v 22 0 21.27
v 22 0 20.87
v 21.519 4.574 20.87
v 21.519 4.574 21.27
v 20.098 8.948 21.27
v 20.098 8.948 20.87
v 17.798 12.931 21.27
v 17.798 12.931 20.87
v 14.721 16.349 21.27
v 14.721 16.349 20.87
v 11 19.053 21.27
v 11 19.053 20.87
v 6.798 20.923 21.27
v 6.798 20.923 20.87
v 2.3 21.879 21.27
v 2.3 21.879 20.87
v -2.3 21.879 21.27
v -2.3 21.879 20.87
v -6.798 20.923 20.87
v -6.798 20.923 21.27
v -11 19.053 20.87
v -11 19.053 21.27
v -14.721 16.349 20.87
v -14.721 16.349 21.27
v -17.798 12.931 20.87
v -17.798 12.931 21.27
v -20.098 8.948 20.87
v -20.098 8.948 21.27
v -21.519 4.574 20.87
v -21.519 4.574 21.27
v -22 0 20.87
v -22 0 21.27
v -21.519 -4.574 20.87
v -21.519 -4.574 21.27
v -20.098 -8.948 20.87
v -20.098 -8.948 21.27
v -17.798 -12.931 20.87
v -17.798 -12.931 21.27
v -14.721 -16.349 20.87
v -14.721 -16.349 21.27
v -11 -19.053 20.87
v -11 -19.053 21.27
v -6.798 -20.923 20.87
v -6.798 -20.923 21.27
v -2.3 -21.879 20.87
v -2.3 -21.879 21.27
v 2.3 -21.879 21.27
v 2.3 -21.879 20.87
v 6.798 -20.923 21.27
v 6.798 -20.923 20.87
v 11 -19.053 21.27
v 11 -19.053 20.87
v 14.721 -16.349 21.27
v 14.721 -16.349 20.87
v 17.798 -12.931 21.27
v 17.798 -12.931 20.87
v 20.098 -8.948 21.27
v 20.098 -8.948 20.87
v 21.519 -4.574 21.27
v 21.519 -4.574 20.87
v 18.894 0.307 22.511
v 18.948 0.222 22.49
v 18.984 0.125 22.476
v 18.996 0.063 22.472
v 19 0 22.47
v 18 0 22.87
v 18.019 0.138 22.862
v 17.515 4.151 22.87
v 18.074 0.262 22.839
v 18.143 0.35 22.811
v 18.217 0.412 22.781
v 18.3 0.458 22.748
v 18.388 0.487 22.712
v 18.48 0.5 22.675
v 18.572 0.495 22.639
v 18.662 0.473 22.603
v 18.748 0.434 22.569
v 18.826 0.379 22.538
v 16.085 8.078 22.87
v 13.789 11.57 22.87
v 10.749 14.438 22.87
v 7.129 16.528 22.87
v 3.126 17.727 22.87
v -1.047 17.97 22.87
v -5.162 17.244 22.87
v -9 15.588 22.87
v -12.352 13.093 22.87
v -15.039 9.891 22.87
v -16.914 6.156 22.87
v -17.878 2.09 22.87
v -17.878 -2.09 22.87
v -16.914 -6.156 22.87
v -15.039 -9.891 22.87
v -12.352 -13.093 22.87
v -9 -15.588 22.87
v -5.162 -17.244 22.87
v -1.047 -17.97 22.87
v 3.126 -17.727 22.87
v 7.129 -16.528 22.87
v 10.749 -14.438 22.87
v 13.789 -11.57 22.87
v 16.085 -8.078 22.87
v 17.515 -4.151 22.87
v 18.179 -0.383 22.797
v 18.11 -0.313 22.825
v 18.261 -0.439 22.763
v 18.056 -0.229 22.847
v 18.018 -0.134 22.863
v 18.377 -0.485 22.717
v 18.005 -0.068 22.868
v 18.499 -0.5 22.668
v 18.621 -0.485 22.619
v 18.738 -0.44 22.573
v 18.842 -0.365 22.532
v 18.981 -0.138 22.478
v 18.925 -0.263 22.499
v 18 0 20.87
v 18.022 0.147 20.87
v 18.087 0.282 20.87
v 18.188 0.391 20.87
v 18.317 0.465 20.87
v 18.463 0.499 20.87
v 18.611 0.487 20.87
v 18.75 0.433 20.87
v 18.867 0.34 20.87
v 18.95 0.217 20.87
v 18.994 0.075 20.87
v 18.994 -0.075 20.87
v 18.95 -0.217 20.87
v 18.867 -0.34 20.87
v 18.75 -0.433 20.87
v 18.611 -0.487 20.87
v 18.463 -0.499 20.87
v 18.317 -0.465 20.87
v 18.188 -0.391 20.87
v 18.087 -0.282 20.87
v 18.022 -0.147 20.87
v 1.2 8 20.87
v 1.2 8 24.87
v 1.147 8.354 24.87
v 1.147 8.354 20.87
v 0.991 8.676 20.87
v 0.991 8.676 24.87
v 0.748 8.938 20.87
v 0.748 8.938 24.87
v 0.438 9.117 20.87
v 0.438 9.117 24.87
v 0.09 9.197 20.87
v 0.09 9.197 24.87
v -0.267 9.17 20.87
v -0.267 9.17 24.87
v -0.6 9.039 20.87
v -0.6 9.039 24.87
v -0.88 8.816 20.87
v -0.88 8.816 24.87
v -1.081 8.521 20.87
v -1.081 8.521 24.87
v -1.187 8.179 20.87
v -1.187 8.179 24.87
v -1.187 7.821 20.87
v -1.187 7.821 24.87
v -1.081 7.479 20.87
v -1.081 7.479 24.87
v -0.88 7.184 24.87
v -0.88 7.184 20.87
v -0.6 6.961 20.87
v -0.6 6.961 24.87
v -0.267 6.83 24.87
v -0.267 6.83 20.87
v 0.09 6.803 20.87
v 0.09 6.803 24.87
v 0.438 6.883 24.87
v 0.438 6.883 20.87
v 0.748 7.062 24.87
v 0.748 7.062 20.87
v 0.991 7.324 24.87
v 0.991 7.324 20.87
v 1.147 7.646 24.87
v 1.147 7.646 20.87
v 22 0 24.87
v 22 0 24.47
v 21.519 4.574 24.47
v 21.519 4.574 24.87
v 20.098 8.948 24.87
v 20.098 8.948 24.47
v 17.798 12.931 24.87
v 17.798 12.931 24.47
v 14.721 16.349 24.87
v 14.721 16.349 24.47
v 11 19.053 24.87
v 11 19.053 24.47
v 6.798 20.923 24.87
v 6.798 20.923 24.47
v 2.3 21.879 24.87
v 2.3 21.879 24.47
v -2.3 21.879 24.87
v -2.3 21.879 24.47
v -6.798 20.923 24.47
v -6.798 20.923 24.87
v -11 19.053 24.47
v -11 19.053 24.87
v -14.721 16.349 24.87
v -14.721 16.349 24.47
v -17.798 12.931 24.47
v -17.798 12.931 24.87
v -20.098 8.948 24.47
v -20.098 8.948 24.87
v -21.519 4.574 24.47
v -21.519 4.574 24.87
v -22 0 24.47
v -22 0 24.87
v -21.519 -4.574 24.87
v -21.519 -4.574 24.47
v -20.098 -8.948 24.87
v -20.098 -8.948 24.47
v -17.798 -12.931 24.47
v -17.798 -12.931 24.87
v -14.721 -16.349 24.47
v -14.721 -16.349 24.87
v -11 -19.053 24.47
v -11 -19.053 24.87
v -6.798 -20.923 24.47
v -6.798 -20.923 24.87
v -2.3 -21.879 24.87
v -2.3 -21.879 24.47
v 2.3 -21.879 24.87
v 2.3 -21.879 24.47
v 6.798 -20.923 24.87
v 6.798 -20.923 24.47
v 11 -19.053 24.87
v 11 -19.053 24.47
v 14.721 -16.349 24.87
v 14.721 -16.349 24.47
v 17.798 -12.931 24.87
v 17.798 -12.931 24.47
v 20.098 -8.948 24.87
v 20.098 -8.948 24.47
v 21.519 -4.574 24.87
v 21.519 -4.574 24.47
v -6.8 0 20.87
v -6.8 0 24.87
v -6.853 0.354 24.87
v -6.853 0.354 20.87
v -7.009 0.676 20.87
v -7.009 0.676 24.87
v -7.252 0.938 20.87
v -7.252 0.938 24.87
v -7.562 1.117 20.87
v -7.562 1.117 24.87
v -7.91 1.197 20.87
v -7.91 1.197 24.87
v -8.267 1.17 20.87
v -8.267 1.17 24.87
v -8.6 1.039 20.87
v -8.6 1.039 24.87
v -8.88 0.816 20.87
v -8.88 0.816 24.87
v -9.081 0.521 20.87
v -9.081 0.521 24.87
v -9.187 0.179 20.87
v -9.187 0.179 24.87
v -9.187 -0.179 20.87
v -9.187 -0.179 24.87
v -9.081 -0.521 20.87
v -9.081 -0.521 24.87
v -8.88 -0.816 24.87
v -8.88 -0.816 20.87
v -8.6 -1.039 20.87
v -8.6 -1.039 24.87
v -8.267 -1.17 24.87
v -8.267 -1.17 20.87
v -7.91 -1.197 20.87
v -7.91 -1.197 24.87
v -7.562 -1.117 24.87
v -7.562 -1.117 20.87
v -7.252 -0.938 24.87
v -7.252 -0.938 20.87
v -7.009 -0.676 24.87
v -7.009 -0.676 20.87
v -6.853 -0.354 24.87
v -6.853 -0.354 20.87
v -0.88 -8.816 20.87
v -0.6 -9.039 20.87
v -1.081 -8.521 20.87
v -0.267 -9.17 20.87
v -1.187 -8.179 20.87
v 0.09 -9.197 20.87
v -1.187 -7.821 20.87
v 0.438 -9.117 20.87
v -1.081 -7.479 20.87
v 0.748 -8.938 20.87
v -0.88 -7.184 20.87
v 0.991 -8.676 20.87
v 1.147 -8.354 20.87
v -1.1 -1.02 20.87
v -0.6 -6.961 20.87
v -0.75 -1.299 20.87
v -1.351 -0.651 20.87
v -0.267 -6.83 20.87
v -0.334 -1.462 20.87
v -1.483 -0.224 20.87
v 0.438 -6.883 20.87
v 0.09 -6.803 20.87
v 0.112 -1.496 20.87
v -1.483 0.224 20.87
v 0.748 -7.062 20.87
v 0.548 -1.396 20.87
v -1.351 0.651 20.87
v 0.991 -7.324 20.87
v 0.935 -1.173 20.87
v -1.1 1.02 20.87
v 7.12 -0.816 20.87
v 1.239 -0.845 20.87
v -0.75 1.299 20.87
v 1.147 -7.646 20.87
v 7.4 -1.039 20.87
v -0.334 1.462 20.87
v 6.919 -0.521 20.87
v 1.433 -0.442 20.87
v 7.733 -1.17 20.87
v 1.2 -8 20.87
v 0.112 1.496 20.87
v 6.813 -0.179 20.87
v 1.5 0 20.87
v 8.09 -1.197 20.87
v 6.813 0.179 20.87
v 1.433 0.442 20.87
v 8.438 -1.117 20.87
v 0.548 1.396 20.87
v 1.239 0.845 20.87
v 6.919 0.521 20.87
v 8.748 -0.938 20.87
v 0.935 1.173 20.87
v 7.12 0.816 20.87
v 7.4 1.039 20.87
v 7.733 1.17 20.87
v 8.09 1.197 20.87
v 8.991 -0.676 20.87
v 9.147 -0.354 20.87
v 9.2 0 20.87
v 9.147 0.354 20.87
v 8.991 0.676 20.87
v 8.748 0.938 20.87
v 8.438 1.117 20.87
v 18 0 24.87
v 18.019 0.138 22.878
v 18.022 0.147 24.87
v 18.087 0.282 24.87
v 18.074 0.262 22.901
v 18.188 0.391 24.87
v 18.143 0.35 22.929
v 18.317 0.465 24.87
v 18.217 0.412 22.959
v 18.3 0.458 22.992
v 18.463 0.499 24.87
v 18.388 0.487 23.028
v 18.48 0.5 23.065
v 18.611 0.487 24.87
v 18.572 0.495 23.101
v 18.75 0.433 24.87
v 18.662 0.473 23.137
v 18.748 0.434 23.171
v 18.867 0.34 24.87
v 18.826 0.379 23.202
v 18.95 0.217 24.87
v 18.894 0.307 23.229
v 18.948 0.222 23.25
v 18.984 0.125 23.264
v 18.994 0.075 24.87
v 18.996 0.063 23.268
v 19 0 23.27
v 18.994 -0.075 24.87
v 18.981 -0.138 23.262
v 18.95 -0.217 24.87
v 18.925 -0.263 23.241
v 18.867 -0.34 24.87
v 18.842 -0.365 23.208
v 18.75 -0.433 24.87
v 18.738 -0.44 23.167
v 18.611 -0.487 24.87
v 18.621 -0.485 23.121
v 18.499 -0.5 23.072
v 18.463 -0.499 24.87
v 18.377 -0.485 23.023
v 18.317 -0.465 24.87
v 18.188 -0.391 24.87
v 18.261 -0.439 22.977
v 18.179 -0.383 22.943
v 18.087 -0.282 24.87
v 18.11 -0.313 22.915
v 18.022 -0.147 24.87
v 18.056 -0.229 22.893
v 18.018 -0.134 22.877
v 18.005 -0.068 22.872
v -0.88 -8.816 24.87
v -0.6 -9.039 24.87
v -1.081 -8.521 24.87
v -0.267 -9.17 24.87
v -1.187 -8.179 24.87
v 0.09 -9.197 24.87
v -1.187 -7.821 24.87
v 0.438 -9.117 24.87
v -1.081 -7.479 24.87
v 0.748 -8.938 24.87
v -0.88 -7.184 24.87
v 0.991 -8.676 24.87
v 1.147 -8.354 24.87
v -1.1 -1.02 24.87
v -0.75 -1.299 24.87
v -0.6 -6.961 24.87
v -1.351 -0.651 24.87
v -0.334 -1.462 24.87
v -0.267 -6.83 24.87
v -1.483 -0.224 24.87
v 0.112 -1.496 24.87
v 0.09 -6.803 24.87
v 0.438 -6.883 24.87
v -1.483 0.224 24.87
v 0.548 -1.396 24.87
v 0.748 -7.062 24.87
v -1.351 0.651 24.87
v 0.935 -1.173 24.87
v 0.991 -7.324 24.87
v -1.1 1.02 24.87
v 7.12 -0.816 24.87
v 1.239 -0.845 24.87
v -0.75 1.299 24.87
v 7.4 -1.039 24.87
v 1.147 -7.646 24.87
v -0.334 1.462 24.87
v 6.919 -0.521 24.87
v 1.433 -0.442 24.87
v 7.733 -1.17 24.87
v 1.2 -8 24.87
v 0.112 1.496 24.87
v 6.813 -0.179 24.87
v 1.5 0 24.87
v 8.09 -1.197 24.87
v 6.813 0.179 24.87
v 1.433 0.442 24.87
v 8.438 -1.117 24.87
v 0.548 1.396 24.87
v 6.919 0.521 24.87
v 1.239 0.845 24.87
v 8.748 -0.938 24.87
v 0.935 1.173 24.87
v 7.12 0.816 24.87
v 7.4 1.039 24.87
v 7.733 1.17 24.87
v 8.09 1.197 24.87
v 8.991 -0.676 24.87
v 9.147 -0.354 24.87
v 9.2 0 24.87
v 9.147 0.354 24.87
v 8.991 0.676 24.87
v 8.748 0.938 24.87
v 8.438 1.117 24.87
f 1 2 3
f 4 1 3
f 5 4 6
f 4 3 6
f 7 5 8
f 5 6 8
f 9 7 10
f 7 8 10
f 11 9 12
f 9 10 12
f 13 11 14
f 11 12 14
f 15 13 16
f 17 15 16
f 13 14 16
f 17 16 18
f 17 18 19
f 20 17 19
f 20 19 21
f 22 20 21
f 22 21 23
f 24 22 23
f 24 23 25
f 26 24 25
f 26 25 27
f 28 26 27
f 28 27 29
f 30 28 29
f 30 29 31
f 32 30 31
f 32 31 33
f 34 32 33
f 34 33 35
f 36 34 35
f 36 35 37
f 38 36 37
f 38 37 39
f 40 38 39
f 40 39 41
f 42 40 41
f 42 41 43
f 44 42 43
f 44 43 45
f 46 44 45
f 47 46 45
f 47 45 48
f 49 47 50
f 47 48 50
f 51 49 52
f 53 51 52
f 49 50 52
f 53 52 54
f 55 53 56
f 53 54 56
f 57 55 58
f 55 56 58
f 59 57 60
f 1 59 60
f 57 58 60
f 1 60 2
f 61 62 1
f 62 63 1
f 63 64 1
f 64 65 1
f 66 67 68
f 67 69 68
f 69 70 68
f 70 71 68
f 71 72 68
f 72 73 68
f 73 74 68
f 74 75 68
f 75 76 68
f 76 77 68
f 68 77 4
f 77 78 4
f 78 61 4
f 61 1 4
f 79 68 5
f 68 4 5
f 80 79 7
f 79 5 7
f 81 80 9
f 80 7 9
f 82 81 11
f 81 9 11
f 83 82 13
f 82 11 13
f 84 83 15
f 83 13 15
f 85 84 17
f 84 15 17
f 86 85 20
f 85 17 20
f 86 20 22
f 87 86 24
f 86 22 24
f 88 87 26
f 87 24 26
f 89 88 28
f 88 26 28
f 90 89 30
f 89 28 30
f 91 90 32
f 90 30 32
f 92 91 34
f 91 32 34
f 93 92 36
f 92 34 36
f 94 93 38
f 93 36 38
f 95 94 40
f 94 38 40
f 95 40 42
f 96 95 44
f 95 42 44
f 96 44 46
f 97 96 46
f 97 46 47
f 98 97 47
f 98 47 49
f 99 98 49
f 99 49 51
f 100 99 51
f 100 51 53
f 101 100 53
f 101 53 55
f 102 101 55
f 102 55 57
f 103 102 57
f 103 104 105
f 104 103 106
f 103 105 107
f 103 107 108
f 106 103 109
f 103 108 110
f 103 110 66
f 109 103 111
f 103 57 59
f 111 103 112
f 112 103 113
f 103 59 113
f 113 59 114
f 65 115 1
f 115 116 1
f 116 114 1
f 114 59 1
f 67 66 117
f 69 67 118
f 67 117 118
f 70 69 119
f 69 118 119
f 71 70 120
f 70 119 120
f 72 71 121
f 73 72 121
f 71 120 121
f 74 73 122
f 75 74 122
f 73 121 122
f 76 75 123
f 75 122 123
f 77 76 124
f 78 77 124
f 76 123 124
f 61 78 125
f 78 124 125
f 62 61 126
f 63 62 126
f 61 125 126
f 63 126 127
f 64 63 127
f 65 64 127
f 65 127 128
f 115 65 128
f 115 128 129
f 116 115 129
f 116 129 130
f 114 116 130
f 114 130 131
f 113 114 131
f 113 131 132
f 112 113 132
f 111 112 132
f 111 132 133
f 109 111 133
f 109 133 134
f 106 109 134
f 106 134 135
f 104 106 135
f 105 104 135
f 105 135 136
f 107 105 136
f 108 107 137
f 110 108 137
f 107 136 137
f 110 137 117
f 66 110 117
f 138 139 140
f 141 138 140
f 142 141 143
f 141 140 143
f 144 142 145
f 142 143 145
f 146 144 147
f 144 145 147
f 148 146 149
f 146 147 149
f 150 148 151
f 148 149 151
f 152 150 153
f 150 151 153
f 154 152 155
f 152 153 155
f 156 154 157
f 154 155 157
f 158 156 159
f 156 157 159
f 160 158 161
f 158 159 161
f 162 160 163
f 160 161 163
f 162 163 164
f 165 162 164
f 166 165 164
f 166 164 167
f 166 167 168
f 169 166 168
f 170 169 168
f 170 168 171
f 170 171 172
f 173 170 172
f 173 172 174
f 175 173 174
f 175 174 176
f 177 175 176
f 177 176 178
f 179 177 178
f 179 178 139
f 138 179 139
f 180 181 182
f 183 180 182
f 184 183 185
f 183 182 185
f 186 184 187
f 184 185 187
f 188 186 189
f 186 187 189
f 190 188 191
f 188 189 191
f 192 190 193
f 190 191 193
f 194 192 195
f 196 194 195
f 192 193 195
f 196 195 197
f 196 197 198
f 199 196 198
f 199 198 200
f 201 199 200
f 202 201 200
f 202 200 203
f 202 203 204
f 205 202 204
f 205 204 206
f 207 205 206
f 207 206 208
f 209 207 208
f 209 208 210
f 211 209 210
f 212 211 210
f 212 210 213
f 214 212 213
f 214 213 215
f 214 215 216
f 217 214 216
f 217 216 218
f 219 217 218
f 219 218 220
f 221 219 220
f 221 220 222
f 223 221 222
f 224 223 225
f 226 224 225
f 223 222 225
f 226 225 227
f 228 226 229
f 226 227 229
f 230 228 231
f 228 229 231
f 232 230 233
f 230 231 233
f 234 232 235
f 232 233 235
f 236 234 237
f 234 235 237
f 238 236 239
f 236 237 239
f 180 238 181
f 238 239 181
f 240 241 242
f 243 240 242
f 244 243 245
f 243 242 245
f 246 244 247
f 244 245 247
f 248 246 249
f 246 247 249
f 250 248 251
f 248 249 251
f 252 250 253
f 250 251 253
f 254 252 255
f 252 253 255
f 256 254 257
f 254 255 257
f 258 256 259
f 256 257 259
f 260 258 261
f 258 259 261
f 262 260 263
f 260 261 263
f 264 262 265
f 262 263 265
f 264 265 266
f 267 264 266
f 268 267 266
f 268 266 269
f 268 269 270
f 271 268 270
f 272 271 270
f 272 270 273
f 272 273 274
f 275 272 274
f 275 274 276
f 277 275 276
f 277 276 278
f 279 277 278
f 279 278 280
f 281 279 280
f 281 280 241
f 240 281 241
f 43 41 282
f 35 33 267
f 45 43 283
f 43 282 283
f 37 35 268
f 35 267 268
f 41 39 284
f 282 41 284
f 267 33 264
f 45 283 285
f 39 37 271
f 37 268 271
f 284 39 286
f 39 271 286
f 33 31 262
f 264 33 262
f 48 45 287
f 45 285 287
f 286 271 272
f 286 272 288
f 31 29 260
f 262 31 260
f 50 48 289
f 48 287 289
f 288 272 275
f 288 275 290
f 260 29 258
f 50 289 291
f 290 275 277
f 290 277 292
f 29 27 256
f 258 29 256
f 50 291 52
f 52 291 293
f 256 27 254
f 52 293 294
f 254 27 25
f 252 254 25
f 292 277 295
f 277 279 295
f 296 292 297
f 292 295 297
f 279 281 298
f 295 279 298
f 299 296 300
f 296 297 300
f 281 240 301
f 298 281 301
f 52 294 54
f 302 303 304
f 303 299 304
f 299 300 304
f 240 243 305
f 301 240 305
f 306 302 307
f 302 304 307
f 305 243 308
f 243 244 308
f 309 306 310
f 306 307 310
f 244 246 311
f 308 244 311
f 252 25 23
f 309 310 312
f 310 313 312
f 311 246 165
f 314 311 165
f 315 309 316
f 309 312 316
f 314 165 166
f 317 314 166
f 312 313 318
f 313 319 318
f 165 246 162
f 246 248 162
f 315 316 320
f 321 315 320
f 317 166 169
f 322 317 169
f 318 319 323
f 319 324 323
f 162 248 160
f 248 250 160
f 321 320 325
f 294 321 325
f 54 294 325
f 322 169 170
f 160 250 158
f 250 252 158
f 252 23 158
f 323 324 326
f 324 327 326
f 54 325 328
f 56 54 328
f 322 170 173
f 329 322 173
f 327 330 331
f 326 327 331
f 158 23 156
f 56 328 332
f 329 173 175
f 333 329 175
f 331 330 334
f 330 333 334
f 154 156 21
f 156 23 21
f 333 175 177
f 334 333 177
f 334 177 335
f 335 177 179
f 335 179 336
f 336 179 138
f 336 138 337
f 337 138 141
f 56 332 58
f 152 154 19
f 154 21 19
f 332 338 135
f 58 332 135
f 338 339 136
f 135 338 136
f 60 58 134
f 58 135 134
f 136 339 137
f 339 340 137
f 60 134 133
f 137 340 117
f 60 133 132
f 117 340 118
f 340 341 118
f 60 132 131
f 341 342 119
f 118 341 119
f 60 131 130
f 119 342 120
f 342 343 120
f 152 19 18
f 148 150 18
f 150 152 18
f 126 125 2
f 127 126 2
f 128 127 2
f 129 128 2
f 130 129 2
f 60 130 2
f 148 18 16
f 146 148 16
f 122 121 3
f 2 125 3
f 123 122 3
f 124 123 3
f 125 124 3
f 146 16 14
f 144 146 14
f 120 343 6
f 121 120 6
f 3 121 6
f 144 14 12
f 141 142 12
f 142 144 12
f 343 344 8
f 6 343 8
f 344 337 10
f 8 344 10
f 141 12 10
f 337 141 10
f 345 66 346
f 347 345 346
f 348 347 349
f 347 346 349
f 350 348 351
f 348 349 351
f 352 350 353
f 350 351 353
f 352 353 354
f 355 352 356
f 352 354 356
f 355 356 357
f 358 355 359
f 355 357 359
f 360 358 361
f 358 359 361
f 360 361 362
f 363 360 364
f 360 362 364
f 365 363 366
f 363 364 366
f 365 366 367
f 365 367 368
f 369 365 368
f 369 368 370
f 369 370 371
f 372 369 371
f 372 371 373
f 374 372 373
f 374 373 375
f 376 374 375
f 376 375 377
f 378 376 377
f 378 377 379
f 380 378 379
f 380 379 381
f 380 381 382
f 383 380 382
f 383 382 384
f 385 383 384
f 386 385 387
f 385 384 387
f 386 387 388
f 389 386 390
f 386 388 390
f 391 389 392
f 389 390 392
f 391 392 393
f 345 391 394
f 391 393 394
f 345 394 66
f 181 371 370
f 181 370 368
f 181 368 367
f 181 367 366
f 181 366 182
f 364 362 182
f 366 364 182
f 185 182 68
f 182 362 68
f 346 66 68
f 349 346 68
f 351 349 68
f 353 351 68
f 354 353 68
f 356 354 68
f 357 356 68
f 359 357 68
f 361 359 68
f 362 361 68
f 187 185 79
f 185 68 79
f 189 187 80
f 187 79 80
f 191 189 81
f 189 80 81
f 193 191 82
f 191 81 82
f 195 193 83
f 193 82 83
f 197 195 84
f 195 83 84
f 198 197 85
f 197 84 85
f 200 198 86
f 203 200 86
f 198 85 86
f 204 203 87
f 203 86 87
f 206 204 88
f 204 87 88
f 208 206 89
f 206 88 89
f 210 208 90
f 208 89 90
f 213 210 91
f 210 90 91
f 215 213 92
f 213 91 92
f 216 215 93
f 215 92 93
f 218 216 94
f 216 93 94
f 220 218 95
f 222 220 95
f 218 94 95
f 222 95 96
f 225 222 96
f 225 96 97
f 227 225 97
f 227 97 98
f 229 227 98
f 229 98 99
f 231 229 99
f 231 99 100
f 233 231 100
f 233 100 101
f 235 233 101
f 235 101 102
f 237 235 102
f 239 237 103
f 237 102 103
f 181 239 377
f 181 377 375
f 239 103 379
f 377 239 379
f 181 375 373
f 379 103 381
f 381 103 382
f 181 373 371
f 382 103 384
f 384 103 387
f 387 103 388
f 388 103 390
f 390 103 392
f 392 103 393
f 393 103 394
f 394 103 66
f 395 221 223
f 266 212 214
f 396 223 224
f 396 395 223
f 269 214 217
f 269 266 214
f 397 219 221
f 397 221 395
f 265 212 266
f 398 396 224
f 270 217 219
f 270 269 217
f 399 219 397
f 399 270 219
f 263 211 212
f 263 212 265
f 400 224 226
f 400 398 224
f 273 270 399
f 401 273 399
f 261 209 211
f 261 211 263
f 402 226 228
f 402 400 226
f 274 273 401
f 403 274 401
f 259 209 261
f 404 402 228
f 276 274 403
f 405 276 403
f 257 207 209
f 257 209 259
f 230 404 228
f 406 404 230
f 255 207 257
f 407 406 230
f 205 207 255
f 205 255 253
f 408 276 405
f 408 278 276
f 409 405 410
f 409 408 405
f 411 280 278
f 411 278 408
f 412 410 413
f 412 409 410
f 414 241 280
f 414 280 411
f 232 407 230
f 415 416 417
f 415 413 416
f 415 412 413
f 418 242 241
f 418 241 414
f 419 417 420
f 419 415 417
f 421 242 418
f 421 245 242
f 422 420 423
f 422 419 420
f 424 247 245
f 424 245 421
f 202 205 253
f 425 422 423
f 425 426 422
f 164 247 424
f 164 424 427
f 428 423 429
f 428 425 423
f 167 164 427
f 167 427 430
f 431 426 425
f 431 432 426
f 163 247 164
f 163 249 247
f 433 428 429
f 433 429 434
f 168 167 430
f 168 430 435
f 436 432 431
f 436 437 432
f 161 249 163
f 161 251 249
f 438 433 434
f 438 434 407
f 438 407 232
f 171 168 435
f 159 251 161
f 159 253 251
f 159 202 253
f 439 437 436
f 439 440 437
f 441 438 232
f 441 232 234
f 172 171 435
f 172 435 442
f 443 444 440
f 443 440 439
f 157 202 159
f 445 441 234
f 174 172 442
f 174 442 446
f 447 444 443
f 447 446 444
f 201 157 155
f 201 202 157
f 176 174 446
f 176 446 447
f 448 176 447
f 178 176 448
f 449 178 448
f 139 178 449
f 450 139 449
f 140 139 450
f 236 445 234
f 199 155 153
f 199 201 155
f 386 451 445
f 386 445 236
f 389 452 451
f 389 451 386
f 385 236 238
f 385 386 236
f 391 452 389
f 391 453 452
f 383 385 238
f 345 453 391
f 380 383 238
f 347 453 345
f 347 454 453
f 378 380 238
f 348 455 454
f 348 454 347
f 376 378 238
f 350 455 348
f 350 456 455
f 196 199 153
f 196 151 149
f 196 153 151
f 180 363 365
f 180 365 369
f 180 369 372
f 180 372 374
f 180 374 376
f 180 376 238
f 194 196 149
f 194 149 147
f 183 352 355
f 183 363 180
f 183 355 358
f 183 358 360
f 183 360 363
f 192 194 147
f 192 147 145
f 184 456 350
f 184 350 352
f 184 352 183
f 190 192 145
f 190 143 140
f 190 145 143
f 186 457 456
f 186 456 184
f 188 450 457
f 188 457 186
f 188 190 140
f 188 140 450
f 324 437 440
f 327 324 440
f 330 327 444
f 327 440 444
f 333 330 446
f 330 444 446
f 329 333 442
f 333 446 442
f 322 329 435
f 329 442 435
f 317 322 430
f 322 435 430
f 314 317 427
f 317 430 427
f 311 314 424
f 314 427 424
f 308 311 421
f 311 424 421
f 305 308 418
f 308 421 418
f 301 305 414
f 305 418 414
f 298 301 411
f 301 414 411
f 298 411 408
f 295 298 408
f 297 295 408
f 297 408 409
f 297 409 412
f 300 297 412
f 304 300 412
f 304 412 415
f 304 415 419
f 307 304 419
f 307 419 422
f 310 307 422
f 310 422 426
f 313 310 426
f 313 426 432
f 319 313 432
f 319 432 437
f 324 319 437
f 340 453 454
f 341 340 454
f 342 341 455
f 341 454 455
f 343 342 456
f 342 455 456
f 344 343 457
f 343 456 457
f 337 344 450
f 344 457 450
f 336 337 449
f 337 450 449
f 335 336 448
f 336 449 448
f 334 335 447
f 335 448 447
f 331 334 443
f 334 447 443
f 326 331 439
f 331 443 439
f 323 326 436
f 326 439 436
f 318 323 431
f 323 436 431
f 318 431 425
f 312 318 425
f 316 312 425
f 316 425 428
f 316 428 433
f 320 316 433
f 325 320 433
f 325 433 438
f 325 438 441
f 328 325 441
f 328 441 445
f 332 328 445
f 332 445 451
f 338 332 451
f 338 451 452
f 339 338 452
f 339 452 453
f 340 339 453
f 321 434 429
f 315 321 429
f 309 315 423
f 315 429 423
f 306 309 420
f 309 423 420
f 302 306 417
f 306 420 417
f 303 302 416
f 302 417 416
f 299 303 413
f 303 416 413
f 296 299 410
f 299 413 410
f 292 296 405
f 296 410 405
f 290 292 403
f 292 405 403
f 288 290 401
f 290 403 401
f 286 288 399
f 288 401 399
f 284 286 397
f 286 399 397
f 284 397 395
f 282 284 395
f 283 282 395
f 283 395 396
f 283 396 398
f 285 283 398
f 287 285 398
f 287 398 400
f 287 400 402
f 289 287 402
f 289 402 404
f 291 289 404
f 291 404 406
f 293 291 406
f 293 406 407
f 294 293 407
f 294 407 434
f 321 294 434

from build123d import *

# Parameters (mm, degrees)
SKETCH1_R                = 22
BOSS_EXTRUDE1_DEPTH      = 4
M2_CLEARANCE_HOLE1_D     = 2.4
F_1_0_1_DIAMETER_HOLE1_D = 1
F_3_0_3_DIAMETER_HOLE1_D = 3


# Read off the part's stored shape, not the designer's step: Imported1
with BuildPart() as part:
    # Sketch1 → Boss-Extrude1 (new body)
    with BuildSketch(Plane.XY.offset(20.87)):
        Circle(SKETCH1_R)
    extrude(amount=BOSS_EXTRUDE1_DEPTH)

    # M2 Clearance Hole1 (through all)
    with Locations(Plane(origin=(0, 0, 20.87), x_dir=(-1, 0, 0), z_dir=(0, 0, -1))):
        with Locations((0, 8), (-8, 0), (0, -8), (8, 0)):
            Hole(M2_CLEARANCE_HOLE1_D / 2)

    # Sketch4 → Cut-Revolve5 (revolve, cut)
    with BuildSketch(Plane(origin=(0, 0, 0), x_dir=(0, 0, -1), z_dir=(1, 0, 0)), mode=Mode.PRIVATE) as cut_revolve5_sk:
        Polygon((-21.27, 22), (-24.47, 22), (-22.87, 18), align=None)
    revolve(cut_revolve5_sk.sketch.rotate(Axis((0, 0, 24.47), (0, 0, 1)), 270), axis=Axis((0, 0, 24.47), (0, 0, 1)), mode=Mode.SUBTRACT)

    # Ø1.0 (1) Diameter Hole1 (through all)
    with Locations(Plane.XY.offset(24.87)):
        with Locations((18.5, 0)):
            Hole(F_1_0_1_DIAMETER_HOLE1_D / 2)

    # Ø3.0 (3) Diameter Hole1 (through all)
    with Locations(Plane(origin=(0, 0, 20.87), x_dir=(-1, 0, 0), z_dir=(0, 0, -1))):
        with Locations((0, 0)):
            Hole(F_3_0_3_DIAMETER_HOLE1_D / 2)


solid = part.part
